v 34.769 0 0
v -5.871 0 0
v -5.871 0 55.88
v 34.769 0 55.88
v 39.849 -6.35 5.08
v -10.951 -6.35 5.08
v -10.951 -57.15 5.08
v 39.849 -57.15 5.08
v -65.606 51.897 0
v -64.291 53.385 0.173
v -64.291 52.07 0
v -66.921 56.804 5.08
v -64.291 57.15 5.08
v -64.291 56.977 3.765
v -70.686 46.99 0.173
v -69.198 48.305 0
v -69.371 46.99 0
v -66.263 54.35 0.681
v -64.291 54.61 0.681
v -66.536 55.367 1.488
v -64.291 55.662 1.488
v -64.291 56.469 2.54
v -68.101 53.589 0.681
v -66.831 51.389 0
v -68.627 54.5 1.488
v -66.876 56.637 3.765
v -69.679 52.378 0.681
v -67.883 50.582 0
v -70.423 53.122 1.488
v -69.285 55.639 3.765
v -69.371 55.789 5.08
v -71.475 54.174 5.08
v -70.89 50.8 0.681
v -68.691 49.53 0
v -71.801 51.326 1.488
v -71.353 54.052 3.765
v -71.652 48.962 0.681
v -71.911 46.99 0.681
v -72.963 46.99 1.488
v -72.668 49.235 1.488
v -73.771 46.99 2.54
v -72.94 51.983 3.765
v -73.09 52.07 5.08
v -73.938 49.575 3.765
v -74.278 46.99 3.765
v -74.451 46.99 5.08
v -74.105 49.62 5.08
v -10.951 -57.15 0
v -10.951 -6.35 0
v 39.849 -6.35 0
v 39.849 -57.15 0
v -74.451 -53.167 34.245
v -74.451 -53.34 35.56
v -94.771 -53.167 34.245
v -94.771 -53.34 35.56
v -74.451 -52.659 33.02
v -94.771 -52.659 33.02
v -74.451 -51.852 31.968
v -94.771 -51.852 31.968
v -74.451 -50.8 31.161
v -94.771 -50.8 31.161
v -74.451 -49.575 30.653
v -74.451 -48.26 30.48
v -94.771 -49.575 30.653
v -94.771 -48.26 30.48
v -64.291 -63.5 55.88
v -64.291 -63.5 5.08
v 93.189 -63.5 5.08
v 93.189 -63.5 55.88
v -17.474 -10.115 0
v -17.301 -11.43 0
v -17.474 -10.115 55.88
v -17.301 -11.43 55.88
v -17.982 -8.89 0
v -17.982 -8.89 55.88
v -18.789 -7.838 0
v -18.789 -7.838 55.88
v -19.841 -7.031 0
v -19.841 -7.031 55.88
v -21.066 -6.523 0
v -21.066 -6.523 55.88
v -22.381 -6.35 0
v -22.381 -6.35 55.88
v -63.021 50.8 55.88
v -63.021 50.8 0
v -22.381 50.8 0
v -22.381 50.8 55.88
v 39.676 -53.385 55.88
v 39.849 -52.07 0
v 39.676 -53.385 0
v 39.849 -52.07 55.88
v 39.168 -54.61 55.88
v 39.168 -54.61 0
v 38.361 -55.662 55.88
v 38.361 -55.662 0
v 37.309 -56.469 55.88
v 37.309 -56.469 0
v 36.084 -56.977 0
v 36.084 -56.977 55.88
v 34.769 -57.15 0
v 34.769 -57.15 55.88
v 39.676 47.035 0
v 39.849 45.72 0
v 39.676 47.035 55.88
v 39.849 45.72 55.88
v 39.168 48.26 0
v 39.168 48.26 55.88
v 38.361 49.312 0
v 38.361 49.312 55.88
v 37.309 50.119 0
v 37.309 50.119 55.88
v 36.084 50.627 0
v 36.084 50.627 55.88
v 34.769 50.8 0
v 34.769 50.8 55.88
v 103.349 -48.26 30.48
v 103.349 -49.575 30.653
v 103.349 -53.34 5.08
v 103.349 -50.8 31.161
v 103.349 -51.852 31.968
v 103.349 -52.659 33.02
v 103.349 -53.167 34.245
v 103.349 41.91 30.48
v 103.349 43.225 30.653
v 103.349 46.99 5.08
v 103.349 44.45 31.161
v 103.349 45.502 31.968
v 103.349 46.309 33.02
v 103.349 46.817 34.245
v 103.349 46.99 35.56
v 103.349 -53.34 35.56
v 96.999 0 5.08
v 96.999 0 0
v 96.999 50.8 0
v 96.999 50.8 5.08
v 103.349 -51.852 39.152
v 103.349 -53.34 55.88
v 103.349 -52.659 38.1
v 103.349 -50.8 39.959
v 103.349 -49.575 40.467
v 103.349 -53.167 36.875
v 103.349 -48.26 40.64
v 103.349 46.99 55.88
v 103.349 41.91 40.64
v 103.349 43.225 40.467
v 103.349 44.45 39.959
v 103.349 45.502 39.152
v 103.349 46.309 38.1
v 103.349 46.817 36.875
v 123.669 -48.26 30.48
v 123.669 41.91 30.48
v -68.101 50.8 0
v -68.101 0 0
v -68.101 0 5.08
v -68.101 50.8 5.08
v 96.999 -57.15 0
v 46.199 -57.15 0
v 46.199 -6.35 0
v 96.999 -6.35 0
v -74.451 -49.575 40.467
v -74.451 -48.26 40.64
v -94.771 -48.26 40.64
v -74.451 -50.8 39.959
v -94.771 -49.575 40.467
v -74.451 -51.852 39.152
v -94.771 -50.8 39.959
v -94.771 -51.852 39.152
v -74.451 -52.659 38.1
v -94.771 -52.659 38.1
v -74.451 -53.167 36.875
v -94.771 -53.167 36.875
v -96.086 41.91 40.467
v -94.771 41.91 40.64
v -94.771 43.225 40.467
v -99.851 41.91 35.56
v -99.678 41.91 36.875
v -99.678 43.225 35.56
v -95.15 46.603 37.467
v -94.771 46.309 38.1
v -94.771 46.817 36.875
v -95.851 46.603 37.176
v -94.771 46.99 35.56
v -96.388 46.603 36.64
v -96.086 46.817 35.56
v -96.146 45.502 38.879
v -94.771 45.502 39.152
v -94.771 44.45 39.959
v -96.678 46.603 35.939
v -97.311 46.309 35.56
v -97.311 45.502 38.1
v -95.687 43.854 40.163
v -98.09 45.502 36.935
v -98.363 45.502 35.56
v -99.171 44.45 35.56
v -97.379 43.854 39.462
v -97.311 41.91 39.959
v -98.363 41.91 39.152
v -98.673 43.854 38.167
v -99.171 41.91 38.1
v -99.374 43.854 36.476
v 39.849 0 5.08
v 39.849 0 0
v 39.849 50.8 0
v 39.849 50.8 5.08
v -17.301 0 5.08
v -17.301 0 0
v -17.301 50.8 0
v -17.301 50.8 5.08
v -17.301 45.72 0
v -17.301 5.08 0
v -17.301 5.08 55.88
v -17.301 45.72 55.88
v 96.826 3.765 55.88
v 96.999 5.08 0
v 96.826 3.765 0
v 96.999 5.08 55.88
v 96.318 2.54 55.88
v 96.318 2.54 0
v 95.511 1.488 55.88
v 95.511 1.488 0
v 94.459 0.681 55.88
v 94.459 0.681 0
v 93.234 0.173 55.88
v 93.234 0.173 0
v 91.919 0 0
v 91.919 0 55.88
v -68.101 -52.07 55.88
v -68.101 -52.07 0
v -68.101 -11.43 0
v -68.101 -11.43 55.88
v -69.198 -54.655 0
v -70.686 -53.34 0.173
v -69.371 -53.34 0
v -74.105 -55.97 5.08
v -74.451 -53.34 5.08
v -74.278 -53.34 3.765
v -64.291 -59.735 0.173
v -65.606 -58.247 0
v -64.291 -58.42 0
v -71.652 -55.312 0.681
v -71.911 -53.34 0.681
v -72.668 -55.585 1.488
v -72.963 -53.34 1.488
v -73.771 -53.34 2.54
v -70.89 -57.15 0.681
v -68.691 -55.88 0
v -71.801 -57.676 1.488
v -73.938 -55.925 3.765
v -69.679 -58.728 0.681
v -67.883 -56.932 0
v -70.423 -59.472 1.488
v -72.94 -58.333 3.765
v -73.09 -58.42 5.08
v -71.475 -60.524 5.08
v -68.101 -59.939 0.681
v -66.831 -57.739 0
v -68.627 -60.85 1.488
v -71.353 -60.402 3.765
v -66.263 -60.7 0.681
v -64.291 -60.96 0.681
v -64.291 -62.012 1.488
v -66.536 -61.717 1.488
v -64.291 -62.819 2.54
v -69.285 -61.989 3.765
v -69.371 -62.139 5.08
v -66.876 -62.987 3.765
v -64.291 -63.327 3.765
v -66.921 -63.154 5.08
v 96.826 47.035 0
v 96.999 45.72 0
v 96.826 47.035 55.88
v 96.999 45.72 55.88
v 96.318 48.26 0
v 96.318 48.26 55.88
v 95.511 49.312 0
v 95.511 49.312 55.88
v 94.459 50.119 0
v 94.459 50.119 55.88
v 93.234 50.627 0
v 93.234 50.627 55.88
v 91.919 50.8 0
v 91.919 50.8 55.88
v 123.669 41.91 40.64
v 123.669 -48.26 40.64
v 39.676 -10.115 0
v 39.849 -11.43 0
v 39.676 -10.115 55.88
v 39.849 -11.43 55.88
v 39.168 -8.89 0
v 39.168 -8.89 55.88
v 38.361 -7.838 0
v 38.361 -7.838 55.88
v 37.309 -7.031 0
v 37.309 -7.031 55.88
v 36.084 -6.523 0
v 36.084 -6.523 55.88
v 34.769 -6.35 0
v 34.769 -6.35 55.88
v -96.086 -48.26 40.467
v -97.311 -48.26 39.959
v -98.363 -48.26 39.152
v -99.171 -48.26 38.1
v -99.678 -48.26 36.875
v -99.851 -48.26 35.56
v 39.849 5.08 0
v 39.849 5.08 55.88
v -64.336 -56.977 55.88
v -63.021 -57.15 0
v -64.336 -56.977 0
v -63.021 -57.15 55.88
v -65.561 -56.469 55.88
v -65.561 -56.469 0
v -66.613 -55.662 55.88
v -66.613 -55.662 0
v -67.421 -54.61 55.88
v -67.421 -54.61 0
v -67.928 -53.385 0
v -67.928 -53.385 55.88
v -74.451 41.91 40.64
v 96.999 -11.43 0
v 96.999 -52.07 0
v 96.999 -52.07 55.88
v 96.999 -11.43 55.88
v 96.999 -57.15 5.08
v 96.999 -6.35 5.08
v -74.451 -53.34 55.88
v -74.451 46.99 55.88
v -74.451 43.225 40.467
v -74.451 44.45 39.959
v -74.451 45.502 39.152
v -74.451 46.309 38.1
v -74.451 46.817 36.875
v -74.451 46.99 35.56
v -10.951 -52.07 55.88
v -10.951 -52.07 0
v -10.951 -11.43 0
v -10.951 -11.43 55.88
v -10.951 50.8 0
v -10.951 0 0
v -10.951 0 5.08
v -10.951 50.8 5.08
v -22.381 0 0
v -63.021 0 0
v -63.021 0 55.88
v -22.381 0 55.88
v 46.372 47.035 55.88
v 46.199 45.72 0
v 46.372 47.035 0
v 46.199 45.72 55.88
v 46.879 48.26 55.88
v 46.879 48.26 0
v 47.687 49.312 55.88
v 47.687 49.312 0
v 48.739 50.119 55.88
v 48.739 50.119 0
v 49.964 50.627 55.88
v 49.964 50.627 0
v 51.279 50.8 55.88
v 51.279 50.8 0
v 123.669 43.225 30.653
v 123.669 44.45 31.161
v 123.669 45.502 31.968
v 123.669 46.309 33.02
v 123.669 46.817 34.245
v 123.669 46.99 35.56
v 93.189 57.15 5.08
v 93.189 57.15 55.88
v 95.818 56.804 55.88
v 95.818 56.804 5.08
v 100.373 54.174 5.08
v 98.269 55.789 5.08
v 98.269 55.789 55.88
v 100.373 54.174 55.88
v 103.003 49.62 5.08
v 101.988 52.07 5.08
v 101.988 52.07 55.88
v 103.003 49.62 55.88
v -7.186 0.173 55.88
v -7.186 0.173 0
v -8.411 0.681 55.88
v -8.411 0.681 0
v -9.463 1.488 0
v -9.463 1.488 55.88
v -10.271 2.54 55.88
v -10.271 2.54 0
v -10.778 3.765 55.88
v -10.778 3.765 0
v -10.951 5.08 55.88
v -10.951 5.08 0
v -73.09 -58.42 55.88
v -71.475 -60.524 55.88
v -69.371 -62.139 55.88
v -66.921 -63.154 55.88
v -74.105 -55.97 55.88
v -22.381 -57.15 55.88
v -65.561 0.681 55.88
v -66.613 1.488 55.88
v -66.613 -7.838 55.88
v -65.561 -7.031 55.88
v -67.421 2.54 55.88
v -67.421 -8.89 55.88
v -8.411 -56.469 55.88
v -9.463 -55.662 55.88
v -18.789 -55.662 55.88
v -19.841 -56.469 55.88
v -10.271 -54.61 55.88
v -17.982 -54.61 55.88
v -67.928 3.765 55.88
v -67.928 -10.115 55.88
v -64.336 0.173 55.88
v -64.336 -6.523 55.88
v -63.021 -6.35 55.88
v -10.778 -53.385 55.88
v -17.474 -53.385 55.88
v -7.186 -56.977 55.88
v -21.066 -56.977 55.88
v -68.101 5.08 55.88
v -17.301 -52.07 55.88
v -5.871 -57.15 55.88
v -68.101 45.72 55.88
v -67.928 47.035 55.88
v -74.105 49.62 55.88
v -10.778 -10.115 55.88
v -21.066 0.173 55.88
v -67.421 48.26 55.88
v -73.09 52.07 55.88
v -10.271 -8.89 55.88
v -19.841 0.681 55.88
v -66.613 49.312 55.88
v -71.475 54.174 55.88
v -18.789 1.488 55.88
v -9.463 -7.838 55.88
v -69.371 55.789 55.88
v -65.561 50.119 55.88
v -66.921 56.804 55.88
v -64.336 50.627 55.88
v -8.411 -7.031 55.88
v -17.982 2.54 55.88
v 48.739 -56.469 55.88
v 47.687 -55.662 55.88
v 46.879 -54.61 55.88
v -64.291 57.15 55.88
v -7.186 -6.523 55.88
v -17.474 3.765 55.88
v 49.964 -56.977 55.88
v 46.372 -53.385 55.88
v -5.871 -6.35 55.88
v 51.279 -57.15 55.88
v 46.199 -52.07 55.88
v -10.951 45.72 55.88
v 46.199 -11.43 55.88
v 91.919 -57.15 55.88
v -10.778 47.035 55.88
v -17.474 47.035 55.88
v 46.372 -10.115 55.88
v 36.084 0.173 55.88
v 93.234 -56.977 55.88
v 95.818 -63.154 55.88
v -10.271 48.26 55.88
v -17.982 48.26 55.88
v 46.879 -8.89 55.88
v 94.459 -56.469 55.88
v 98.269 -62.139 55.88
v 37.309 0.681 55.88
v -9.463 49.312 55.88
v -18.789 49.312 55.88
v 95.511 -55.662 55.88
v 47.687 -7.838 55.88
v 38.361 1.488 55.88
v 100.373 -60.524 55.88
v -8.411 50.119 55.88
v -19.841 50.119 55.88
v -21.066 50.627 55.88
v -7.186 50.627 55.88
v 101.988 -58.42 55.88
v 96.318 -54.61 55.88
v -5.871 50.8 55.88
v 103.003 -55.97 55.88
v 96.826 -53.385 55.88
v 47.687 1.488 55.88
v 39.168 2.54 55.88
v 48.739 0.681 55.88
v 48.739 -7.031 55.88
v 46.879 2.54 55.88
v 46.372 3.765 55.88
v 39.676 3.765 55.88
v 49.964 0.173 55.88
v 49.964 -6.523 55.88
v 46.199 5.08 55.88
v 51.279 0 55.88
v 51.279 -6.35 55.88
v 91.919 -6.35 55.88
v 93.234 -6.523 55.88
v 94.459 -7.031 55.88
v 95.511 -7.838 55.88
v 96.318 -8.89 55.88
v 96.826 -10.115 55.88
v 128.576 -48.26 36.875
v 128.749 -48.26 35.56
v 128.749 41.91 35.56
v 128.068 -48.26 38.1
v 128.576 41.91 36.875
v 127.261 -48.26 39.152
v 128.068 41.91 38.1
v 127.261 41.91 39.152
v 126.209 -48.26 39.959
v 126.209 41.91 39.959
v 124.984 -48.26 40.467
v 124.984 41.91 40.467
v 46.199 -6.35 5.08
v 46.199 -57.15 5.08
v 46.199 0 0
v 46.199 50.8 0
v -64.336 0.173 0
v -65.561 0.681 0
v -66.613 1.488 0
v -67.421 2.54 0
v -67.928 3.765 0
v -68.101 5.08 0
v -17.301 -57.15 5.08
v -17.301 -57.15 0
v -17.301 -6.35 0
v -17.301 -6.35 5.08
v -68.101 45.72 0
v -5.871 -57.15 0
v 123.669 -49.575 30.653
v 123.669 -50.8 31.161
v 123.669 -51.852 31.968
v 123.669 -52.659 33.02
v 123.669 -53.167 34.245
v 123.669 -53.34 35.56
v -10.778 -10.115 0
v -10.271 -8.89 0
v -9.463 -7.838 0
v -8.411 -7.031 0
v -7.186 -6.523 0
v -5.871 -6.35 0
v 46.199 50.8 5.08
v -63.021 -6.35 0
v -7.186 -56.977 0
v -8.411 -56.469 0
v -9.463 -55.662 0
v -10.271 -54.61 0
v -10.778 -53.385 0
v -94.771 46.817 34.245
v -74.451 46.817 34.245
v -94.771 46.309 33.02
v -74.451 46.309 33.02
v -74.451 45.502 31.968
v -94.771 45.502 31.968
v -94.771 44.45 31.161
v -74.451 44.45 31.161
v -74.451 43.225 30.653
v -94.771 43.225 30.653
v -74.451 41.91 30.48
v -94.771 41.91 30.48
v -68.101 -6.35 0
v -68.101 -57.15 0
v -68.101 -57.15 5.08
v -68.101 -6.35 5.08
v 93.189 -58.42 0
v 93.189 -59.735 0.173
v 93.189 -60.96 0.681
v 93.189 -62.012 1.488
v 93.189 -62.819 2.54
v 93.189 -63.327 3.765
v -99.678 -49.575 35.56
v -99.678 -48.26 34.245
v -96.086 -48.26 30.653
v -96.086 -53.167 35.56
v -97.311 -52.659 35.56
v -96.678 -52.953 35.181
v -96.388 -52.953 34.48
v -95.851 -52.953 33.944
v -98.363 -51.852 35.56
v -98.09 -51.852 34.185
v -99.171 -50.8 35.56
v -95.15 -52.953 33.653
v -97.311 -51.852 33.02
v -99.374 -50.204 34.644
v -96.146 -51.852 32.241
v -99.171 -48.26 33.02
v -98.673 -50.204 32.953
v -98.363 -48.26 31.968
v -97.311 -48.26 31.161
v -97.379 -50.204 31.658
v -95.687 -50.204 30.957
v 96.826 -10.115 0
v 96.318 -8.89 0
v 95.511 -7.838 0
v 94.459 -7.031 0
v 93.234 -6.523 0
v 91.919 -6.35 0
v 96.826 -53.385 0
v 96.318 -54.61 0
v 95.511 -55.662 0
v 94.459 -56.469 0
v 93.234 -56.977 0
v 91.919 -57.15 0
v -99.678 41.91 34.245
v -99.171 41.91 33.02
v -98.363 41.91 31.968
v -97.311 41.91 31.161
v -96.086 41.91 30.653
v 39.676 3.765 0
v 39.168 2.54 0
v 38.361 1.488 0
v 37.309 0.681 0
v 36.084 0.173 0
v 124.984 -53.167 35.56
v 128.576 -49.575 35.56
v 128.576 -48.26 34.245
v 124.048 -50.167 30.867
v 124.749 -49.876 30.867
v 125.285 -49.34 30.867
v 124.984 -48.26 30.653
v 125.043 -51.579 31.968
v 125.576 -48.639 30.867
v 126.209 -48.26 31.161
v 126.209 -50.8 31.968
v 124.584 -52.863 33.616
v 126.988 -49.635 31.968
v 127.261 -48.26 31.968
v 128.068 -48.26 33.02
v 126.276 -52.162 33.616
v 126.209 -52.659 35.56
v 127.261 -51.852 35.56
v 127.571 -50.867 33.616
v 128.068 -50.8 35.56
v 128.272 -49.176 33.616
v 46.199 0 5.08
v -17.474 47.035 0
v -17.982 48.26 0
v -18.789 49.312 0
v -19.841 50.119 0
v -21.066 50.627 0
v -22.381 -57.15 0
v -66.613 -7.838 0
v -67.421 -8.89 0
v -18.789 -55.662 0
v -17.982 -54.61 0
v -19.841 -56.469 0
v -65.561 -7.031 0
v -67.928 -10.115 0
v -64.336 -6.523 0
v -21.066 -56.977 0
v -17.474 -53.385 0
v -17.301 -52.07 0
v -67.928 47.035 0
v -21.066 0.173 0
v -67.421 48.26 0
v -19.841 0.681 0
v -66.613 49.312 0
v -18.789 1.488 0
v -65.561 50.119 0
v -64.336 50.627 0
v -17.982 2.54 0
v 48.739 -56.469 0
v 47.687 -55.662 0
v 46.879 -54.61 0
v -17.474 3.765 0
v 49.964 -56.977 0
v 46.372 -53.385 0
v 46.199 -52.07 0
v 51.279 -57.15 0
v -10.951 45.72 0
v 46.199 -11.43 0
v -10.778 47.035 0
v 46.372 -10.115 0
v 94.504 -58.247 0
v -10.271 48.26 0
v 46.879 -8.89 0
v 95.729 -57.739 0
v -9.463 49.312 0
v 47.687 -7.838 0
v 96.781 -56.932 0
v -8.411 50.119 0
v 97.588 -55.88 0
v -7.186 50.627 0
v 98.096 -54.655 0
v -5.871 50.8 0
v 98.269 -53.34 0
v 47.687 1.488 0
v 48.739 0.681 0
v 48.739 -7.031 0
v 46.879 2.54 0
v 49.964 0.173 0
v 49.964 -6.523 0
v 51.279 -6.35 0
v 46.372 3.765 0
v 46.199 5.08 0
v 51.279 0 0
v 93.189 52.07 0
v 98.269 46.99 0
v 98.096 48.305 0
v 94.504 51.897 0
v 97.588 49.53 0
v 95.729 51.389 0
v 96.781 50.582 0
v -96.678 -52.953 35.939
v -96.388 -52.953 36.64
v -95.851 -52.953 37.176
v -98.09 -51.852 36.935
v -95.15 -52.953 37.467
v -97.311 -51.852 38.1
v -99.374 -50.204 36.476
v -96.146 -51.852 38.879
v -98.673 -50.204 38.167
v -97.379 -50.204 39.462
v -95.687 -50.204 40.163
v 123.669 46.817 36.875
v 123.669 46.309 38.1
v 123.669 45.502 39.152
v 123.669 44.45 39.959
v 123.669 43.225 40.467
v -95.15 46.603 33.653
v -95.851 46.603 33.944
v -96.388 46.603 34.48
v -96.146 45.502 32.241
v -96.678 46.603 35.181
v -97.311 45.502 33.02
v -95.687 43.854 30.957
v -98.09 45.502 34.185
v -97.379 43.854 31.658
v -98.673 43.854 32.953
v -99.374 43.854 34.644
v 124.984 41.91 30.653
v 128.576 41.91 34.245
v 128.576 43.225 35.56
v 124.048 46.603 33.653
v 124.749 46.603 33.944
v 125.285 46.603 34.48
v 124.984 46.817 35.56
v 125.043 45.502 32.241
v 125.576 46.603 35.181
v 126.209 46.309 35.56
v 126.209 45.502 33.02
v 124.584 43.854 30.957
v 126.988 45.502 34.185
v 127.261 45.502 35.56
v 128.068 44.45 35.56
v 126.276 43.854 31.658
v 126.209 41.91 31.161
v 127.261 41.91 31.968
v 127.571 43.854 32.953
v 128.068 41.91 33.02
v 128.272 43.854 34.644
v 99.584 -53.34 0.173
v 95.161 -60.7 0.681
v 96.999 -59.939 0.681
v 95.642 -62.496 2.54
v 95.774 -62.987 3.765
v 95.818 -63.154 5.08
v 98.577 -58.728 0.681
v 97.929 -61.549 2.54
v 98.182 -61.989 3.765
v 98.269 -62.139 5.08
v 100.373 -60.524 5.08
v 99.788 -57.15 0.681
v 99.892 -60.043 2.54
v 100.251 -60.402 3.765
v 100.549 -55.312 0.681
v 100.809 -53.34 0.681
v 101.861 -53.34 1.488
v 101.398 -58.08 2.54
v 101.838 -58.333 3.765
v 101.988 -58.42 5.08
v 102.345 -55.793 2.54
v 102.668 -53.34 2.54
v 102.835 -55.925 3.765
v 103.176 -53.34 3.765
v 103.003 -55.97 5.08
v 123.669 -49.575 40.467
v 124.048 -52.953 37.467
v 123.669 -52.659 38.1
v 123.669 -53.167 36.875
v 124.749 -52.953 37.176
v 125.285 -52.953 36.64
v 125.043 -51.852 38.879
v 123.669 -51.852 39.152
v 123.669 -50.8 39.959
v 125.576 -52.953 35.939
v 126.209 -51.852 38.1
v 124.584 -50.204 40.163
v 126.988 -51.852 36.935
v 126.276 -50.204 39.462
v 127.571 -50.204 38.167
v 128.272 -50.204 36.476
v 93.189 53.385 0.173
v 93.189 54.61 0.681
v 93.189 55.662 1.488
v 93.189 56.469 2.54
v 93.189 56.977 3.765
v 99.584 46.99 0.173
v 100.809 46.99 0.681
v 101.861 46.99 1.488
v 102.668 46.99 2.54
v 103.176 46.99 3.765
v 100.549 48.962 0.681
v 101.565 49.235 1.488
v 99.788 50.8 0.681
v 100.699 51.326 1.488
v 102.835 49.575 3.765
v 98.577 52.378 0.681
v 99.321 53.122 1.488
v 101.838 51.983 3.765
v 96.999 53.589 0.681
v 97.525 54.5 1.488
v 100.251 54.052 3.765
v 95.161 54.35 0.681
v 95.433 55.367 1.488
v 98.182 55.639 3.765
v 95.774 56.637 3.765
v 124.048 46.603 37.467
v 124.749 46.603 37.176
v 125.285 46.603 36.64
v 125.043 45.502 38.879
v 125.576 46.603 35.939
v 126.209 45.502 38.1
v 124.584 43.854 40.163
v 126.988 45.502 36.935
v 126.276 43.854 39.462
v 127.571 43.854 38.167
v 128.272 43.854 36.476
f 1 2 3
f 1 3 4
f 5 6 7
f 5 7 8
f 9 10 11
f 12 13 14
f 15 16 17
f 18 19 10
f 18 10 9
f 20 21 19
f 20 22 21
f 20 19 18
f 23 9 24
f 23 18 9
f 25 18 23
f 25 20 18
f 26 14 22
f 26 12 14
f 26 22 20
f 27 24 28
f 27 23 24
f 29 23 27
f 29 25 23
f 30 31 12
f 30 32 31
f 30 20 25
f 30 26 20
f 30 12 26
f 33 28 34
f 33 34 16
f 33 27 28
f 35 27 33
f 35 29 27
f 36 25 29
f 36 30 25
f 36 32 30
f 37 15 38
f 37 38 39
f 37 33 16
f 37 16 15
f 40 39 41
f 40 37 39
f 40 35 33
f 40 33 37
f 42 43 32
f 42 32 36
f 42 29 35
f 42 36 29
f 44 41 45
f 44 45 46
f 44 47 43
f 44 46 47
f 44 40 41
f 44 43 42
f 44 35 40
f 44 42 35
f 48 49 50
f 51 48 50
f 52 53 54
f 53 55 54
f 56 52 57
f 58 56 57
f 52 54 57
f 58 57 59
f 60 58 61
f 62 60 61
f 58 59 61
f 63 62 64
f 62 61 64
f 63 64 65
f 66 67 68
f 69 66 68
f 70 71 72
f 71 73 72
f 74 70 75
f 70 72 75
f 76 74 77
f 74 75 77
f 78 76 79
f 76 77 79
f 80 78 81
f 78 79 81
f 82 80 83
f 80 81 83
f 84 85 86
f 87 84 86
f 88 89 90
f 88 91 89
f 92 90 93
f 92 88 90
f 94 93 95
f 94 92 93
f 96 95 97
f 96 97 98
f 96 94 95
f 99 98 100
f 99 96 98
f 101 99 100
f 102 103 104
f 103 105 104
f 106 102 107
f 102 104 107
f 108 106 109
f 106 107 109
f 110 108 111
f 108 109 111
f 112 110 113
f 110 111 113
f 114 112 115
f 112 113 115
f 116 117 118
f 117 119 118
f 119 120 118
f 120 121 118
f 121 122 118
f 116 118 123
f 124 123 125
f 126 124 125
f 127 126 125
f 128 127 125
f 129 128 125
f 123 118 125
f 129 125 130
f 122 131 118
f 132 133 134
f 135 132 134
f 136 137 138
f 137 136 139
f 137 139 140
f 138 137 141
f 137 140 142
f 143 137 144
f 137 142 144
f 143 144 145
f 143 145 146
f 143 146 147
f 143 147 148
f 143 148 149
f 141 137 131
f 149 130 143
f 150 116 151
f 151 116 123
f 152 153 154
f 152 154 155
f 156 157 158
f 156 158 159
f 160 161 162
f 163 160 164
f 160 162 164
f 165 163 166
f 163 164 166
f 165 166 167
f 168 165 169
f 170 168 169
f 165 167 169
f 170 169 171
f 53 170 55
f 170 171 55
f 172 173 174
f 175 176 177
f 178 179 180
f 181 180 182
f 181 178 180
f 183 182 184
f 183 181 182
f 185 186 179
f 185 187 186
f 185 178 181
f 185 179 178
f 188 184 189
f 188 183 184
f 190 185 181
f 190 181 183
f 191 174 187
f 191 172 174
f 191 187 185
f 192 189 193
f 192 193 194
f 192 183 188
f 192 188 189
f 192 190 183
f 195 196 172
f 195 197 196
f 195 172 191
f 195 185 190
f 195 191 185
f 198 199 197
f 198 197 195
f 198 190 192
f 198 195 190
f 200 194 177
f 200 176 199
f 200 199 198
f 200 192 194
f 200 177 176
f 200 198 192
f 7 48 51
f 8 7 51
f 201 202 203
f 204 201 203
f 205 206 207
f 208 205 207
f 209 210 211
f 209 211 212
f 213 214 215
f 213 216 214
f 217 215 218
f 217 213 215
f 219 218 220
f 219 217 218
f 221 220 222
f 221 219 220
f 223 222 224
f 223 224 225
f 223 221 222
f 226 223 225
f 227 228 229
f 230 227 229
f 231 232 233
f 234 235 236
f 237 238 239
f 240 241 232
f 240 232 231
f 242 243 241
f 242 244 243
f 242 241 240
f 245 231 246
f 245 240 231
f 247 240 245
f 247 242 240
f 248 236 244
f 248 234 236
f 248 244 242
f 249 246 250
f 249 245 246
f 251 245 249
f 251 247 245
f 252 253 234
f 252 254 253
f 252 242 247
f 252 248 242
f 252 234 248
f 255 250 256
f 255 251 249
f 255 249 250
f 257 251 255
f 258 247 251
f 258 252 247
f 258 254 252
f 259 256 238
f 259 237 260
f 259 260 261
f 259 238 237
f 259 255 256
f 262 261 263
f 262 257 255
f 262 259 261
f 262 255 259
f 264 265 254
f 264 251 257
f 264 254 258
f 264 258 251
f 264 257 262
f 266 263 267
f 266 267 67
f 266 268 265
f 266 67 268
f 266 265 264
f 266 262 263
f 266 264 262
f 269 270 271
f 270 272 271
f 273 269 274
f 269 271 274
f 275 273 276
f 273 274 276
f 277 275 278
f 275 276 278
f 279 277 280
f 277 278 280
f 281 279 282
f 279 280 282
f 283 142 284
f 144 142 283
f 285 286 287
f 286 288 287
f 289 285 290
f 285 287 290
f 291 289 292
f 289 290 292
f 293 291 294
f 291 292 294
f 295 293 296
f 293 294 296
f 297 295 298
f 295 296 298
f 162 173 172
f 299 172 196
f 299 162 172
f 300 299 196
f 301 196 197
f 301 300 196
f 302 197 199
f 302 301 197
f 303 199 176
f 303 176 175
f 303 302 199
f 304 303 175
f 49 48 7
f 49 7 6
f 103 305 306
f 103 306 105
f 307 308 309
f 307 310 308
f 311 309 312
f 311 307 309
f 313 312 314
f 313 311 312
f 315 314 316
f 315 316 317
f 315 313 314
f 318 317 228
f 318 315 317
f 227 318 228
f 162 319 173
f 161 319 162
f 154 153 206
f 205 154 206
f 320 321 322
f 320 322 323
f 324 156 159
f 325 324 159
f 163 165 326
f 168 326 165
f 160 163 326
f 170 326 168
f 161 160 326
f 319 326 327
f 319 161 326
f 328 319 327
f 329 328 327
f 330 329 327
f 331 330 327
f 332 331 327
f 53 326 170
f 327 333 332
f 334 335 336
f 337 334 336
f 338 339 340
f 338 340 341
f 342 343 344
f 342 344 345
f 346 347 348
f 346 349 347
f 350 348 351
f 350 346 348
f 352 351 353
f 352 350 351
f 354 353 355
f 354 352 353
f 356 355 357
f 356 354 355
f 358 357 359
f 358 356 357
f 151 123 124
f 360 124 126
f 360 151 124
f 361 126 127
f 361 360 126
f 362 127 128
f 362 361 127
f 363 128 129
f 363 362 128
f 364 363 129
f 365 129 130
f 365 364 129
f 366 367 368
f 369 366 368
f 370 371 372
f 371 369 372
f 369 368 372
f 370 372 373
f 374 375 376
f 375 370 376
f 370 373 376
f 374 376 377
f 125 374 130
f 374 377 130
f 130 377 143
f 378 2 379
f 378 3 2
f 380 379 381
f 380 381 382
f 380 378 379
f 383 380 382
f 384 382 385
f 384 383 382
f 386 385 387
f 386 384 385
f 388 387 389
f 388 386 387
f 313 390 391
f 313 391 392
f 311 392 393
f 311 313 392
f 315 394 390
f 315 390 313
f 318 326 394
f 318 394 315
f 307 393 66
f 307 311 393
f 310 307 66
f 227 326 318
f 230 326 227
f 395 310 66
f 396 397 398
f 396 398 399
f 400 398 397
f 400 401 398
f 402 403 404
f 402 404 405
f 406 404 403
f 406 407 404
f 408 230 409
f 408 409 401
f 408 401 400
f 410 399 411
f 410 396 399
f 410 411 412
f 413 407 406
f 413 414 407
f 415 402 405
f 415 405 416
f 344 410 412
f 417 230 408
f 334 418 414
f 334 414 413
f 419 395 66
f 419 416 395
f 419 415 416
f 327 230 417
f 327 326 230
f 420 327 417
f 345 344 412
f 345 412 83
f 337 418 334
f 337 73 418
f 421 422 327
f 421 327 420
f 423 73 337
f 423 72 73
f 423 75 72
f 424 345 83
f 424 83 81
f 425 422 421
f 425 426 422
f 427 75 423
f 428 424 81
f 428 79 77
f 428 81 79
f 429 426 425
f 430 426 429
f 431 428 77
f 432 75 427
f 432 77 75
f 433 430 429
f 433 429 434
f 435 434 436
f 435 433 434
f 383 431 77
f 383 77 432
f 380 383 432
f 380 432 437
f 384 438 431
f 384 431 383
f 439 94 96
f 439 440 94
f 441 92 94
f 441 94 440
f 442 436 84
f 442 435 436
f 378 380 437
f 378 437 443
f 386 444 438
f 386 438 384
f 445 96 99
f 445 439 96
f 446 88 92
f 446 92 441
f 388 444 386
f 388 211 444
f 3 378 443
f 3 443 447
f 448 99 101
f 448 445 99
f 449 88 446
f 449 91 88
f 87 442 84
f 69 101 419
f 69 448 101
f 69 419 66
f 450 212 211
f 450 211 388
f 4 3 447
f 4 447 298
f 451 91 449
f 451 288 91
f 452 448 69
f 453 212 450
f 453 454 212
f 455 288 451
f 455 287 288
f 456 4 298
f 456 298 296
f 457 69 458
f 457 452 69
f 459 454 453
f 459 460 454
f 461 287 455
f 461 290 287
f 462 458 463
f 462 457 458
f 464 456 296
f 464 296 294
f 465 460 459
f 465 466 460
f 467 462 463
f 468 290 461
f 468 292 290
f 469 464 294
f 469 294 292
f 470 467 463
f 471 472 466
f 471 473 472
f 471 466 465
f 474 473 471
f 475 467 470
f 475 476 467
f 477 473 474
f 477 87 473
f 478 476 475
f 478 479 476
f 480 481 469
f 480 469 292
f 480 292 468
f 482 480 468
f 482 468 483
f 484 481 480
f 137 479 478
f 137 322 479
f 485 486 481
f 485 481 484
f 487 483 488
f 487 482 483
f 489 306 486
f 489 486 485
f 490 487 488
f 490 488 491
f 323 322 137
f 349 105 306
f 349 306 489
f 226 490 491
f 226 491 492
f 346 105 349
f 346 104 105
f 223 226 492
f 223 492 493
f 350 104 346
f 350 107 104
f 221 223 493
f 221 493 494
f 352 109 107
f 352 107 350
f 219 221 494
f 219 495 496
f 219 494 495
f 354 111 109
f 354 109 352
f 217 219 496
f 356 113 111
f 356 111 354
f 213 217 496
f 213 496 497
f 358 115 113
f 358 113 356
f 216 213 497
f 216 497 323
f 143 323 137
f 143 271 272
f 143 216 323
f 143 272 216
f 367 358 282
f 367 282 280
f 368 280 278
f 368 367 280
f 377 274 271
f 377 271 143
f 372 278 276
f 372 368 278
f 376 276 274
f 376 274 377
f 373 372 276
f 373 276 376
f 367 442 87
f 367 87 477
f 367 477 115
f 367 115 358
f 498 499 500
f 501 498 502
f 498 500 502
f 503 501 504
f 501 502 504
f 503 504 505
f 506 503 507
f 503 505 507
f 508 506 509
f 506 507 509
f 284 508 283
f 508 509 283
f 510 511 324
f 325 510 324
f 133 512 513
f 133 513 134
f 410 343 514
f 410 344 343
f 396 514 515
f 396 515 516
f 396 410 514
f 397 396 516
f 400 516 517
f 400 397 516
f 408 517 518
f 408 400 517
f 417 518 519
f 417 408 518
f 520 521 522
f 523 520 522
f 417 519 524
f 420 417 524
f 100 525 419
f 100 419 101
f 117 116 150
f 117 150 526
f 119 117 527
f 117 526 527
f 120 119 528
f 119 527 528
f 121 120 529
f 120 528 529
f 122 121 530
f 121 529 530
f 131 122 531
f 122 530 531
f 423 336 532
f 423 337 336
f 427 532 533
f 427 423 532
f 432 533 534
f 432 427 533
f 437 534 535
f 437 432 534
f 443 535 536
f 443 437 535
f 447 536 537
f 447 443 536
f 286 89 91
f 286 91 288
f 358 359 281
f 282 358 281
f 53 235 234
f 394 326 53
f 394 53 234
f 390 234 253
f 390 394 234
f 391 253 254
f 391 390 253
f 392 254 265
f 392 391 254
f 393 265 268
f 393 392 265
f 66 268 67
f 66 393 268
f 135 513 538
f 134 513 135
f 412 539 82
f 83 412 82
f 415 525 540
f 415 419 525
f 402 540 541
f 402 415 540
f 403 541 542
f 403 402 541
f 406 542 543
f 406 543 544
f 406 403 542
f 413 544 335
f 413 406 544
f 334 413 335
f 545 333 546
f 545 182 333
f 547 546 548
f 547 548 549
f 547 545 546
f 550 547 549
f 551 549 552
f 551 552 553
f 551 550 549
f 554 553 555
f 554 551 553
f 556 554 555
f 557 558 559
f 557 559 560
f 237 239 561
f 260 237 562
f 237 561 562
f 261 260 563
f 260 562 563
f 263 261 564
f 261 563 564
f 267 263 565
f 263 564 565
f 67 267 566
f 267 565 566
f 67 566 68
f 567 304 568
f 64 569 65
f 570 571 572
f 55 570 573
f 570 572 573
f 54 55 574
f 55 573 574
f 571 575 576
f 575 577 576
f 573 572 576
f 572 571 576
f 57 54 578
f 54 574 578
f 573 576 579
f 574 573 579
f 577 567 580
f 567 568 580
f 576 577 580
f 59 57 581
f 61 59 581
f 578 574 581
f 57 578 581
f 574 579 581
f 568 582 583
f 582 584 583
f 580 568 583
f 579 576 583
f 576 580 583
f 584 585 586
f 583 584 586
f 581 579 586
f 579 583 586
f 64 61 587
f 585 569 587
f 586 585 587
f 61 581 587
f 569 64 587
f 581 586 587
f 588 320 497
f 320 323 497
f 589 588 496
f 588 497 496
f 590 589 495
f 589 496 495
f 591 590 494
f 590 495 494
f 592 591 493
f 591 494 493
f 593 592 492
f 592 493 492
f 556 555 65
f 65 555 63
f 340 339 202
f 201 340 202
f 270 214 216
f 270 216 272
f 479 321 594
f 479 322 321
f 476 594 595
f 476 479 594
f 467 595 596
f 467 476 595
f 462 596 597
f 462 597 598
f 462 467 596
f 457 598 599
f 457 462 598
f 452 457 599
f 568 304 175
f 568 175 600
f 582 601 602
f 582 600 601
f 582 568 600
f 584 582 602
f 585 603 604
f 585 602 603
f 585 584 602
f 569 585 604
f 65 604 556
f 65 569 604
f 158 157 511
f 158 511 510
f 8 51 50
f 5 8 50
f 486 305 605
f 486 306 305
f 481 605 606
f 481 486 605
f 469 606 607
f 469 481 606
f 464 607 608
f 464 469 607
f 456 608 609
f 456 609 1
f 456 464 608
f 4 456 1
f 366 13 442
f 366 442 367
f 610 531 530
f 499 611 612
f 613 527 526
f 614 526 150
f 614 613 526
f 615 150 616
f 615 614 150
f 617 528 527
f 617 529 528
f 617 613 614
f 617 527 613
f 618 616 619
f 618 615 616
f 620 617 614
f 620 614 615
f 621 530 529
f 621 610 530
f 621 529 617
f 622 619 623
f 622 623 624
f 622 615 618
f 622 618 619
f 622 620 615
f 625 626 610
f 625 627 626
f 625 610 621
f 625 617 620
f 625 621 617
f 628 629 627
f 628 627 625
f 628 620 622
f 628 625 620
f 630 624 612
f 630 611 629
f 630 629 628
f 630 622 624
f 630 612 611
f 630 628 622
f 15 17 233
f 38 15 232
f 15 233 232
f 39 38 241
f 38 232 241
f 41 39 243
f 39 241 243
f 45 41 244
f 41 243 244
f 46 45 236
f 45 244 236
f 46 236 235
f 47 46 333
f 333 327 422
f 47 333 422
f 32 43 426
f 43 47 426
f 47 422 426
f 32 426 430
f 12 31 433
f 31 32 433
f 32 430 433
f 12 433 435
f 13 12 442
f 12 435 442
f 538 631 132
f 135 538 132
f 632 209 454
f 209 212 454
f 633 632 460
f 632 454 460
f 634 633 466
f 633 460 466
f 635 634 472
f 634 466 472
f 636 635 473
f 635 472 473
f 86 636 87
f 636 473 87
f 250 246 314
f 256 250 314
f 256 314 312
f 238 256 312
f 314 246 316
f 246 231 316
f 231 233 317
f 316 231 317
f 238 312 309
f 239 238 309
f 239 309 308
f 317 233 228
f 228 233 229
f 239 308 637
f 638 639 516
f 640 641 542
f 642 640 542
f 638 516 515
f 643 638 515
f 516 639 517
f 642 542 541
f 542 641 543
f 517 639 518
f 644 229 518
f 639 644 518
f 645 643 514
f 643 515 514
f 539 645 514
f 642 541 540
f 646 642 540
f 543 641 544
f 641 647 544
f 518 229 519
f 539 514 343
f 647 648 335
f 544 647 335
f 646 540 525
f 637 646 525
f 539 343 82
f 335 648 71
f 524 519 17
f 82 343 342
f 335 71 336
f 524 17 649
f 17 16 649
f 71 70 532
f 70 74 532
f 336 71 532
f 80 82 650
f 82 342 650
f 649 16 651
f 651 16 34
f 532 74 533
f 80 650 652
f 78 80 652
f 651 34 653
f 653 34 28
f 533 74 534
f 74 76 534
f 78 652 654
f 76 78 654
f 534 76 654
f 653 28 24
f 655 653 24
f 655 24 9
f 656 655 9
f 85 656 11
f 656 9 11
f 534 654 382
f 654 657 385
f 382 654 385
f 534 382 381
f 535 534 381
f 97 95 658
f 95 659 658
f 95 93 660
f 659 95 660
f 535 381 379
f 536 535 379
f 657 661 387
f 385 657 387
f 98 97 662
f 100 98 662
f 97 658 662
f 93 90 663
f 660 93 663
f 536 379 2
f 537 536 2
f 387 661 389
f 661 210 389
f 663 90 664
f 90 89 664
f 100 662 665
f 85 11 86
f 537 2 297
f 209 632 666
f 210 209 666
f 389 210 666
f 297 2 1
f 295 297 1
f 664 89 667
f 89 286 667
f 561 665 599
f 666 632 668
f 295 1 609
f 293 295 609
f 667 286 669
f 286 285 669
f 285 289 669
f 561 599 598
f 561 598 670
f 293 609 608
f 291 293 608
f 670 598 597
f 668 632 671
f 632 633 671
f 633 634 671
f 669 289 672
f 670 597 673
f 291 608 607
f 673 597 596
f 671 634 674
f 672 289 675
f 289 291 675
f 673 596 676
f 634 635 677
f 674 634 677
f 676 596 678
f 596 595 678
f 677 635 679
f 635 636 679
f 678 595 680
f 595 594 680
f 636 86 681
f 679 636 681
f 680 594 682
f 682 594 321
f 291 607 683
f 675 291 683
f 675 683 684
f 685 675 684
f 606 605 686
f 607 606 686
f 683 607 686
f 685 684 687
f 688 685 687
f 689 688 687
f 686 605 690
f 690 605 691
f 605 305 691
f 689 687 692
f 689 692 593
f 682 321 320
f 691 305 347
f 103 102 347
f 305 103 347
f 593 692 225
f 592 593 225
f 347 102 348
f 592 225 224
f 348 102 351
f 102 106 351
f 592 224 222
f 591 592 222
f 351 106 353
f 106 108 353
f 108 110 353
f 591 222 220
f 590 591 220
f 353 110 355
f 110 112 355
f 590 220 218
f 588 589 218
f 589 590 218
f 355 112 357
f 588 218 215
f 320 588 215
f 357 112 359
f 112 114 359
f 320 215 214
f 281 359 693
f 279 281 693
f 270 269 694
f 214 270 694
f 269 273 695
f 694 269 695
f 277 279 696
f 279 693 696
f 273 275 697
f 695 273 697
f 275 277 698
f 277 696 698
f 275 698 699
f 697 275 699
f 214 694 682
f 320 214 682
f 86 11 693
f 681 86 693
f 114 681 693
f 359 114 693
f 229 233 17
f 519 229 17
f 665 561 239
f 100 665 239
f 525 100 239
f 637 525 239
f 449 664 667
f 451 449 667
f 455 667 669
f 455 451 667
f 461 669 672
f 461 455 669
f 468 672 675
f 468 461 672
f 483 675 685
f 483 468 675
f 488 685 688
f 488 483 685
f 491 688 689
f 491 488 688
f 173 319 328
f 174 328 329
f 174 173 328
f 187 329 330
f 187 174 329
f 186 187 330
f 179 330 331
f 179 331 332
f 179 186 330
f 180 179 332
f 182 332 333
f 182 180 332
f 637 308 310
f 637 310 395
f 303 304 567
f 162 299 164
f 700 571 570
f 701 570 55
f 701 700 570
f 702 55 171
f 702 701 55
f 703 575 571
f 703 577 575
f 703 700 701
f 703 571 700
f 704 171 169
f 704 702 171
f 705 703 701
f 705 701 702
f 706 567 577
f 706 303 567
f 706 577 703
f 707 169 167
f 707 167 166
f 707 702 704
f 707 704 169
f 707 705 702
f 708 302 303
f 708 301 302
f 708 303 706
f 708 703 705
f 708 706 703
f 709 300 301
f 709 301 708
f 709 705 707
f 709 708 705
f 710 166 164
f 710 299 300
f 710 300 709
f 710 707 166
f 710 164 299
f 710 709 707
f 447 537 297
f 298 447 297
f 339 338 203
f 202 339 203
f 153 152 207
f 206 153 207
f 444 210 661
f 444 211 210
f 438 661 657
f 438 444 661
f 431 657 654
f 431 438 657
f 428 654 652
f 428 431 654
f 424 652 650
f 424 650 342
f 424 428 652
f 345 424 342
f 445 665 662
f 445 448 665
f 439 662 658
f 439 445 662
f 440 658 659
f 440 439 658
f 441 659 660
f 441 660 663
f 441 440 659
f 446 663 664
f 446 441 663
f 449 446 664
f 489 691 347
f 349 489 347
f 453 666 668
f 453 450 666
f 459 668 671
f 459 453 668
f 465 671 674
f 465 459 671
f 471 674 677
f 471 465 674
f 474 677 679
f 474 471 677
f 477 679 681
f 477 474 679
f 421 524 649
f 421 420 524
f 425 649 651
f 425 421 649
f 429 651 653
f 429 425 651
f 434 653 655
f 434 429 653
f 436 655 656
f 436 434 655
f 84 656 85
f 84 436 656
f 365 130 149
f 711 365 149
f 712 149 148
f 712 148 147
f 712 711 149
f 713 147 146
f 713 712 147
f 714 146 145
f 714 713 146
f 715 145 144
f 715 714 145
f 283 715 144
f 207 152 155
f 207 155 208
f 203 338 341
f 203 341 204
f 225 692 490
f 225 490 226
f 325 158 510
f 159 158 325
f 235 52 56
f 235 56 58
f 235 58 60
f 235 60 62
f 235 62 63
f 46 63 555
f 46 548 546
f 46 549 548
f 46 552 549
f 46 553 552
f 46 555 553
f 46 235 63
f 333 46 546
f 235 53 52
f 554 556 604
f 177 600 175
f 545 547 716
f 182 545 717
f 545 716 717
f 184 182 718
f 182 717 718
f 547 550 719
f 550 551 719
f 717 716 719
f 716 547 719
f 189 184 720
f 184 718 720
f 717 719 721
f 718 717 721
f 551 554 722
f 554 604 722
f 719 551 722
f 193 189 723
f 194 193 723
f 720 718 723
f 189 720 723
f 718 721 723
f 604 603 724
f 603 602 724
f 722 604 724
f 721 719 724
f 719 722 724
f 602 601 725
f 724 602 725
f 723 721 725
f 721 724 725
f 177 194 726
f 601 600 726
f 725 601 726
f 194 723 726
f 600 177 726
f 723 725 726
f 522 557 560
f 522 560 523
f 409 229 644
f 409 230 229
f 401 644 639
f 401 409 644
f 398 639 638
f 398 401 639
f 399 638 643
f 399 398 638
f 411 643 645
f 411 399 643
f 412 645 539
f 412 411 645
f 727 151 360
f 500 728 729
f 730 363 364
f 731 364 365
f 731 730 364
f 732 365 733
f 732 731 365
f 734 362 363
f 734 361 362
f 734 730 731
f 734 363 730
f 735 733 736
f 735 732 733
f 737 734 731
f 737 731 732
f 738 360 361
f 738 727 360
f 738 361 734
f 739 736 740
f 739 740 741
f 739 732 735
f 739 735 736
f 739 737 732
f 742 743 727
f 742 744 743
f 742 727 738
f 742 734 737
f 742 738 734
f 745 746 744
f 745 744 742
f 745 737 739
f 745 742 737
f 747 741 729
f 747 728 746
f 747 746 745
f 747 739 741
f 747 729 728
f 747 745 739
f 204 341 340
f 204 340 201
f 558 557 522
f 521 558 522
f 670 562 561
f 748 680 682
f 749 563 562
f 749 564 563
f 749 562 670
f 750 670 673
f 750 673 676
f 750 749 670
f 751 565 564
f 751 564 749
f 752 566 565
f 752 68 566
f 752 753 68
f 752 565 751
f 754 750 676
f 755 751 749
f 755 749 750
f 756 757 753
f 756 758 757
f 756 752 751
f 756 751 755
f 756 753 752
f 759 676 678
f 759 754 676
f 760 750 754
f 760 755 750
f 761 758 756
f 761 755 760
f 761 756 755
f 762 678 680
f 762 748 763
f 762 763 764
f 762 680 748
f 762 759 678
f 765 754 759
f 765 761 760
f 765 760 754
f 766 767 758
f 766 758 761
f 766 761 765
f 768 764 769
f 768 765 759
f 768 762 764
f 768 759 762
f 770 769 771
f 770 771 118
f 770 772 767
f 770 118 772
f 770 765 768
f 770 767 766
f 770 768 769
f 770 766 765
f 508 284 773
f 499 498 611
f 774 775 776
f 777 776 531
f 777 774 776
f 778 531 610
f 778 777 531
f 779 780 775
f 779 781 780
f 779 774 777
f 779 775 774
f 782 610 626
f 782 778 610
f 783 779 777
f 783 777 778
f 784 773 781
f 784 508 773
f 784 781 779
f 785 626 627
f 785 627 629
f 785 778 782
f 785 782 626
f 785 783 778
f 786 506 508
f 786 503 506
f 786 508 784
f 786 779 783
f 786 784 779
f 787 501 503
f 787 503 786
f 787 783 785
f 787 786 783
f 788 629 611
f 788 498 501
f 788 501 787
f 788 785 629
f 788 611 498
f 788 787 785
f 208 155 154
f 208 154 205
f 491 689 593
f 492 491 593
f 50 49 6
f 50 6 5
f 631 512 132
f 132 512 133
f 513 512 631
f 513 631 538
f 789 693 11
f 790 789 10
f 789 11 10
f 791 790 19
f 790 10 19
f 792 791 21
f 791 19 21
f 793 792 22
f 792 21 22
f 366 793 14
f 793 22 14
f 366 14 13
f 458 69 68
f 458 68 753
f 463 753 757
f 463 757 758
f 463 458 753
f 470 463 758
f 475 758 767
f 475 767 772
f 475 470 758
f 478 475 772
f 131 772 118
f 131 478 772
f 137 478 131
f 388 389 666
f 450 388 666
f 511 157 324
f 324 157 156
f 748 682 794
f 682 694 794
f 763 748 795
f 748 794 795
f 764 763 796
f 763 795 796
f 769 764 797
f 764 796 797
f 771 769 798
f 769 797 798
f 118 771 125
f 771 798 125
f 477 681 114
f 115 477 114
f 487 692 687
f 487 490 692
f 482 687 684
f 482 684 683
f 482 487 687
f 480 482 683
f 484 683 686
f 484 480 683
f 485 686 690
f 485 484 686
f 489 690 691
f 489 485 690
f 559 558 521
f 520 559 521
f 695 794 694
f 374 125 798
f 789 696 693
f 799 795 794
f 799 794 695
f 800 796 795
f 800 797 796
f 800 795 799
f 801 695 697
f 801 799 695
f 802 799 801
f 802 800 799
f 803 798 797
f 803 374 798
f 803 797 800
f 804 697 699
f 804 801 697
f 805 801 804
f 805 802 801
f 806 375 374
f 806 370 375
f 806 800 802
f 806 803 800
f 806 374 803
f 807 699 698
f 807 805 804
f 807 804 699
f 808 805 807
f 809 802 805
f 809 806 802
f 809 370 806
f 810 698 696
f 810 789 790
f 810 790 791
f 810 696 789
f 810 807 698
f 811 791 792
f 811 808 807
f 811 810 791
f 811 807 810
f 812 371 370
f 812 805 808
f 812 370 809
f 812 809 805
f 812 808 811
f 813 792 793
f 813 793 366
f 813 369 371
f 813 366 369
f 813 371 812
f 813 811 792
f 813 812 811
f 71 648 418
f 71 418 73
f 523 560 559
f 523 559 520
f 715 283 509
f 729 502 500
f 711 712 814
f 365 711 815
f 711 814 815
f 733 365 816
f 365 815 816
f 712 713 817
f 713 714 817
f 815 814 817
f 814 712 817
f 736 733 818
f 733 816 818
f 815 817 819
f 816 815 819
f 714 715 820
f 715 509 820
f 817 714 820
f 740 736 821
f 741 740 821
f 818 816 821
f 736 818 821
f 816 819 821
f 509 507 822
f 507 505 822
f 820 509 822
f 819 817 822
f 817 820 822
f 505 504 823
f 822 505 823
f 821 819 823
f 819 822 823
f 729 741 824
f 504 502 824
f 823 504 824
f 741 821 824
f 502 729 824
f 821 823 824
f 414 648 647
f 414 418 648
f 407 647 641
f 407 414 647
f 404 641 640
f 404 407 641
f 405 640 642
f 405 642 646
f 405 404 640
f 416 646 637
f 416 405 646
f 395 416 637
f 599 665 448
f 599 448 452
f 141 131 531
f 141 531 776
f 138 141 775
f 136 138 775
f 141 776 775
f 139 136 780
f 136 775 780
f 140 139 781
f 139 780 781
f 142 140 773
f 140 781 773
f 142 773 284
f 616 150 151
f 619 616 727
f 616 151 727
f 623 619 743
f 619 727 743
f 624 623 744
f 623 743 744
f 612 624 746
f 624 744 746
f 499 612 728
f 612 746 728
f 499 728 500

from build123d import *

# Parameters (mm, degrees)
F0_W     = 50.8
F0_H     = 50.8
F1_DEPTH = 5.08
F0_W_2   = 177.8
F0_H_2   = 120.65
F2_DEPTH = 55.88
F3_R     = 10.16
F4_R     = 5.08
F5_W     = 100.33
F5_H     = 10.16
F6_DEPTH = 25.4
F7_R     = 5.07999
F8_W     = 100.33
F8_H     = 10.16
F9_DEPTH = 25.4
F10_R    = 5.07999


# Not quite as in the source:
# - a fillet or chamfer is up to 0.001 mm smaller than in the source, because OpenCascade refuses the exact size


with BuildPart() as f1:
    # F0 (on Top) → F1 (new body)
    with BuildSketch(Plane.XY):
        with Locations((71.5988487065, -31.75)):
            Rectangle(F0_W, F0_H)
    extrude(amount=F1_DEPTH)


with BuildPart() as f1b:
    # F0 (on Top) → F1, piece 2 (new body)
    with BuildSketch(Plane.XY):
        with Locations((14.4488487065, -31.75)):
            Rectangle(F0_W, F0_H)
    extrude(amount=F1_DEPTH)


with BuildPart() as f1c:
    # F0 (on Top) → F1, piece 3 (new body)
    with BuildSketch(Plane.XY):
        with Locations((-42.7011512935, -31.75)):
            Rectangle(F0_W, F0_H)
    extrude(amount=F1_DEPTH)


with BuildPart() as f1d:
    # F0 (on Top) → F1, piece 4 (new body)
    with BuildSketch(Plane.XY):
        with Locations((-42.7011512935, 25.4)):
            Rectangle(F0_W, F0_H)
    extrude(amount=F1_DEPTH)


with BuildPart() as f1e:
    # F0 (on Top) → F1, piece 5 (new body)
    with BuildSketch(Plane.XY):
        with Locations((14.4488487065, 25.4)):
            Rectangle(F0_W, F0_H)
    extrude(amount=F1_DEPTH)


with BuildPart() as f1f:
    # F0 (on Top) → F1, piece 6 (new body)
    with BuildSketch(Plane.XY):
        with Locations((71.5988487065, 25.4)):
            Rectangle(F0_W, F0_H)
    extrude(amount=F1_DEPTH)


with BuildPart() as f2:
    # F0 (on Top) → F2 (new body)
    with BuildSketch(Plane.XY):
        with Locations((14.4488487065, -3.175)):
            Rectangle(F0_W_2, F0_H_2)
        with Locations((-42.7011512935, -31.75)):
            Rectangle(F0_W, F0_H, mode=Mode.SUBTRACT)
        with Locations((14.4488487065, -31.75)):
            Rectangle(F0_W, F0_H, mode=Mode.SUBTRACT)
        with Locations((71.5988487065, -31.75)):
            Rectangle(F0_W, F0_H, mode=Mode.SUBTRACT)
        with Locations((-42.7011512935, 25.4)):
            Rectangle(F0_W, F0_H, mode=Mode.SUBTRACT)
        with Locations((14.4488487065, 25.4)):
            Rectangle(F0_W, F0_H, mode=Mode.SUBTRACT)
        with Locations((71.5988487065, 25.4)):
            Rectangle(F0_W, F0_H, mode=Mode.SUBTRACT)
    extrude(amount=F2_DEPTH)

    # F3
    f3_edges = [f2.edges().sort_by_distance(p)[0] for p in [
        (103.348849, -63.5, 27.94),
        (103.348849, 57.15, 27.94),
        (-74.451151, 57.15, 27.94),
        (-74.451151, -63.5, 27.94),
    ]]
    fillet(f3_edges, radius=F3_R)

    # F4 (call 1 of 25: OpenCascade refuses the feature's edges together)
    f4_edges = [f2.edges().sort_by_distance(p)[0] for p in [
        (-17.301151, -6.35, 27.94),
    ]]
    fillet(f4_edges, radius=F4_R)

    # F4#2 (call 2 of 25)
    f4_2_edges = [f2.edges().sort_by_distance(p)[0] for p in [
        (-17.301151, 50.8, 27.94),
    ]]
    fillet(f4_2_edges, radius=F4_R)

    # F4#3 (call 3 of 25)
    f4_3_edges = [f2.edges().sort_by_distance(p)[0] for p in [
        (39.848849, 50.8, 27.94),
    ]]
    fillet(f4_3_edges, radius=F4_R)

    # F4#4 (call 4 of 25)
    f4_4_edges = [f2.edges().sort_by_distance(p)[0] for p in [
        (96.998849, 50.8, 27.94),
    ]]
    fillet(f4_4_edges, radius=F4_R)

    # F4#5 (call 5 of 25)
    f4_5_edges = [f2.edges().sort_by_distance(p)[0] for p in [
        (96.998849, -6.35, 27.94),
    ]]
    fillet(f4_5_edges, radius=F4_R)

    # F4#6 (call 6 of 25)
    f4_6_edges = [f2.edges().sort_by_distance(p)[0] for p in [
        (39.848849, -6.35, 27.94),
    ]]
    fillet(f4_6_edges, radius=F4_R)

    # F4#7 (call 7 of 25)
    f4_7_edges = [f2.edges().sort_by_distance(p)[0] for p in [
        (96.998849, 0, 27.94),
    ]]
    fillet(f4_7_edges, radius=F4_R)

    # F4#8 (call 8 of 25)
    f4_8_edges = [f2.edges().sort_by_distance(p)[0] for p in [
        (39.848849, 0, 27.94),
    ]]
    fillet(f4_8_edges, radius=F4_R)

    # F4#9 (call 9 of 25)
    f4_9_edges = [f2.edges().sort_by_distance(p)[0] for p in [
        (-17.301151, 0, 27.94),
    ]]
    fillet(f4_9_edges, radius=F4_R)

    # F4#10 (call 10 of 25)
    f4_10_edges = [f2.edges().sort_by_distance(p)[0] for p in [
        (-17.301151, -57.15, 27.94),
    ]]
    fillet(f4_10_edges, radius=F4_R)

    # F4#11 (call 11 of 25)
    f4_11_edges = [f2.edges().sort_by_distance(p)[0] for p in [
        (39.848849, -57.15, 27.94),
    ]]
    fillet(f4_11_edges, radius=F4_R)

    # F4#12 (call 12 of 25)
    f4_12_edges = [f2.edges().sort_by_distance(p)[0] for p in [
        (96.998849, -57.15, 27.94),
    ]]
    fillet(f4_12_edges, radius=F4_R)

    # F4#13 (call 13 of 25)
    f4_13_edges = [f2.edges().sort_by_distance(p)[0] for p in [
        (46.198849, -57.15, 27.94),
    ]]
    fillet(f4_13_edges, radius=F4_R)

    # F4#14 (call 14 of 25)
    f4_14_edges = [f2.edges().sort_by_distance(p)[0] for p in [
        (46.198849, 0, 27.94),
    ]]
    fillet(f4_14_edges, radius=F4_R)

    # F4#15 (call 15 of 25)
    f4_15_edges = [f2.edges().sort_by_distance(p)[0] for p in [
        (-10.951151, -57.15, 27.94),
    ]]
    fillet(f4_15_edges, radius=F4_R)

    # F4#16 (call 16 of 25)
    f4_16_edges = [f2.edges().sort_by_distance(p)[0] for p in [
        (-10.951151, 0, 27.94),
    ]]
    fillet(f4_16_edges, radius=F4_R)

    # F4#17 (call 17 of 25)
    f4_17_edges = [f2.edges().sort_by_distance(p)[0] for p in [
        (-68.101151, 0, 27.94),
    ]]
    fillet(f4_17_edges, radius=F4_R)

    # F4#18 (call 18 of 25)
    f4_18_edges = [f2.edges().sort_by_distance(p)[0] for p in [
        (-68.101151, -57.15, 27.94),
    ]]
    fillet(f4_18_edges, radius=F4_R)

    # F4#19 (call 19 of 25)
    f4_19_edges = [f2.edges().sort_by_distance(p)[0] for p in [
        (46.198849, -6.35, 27.94),
    ]]
    fillet(f4_19_edges, radius=F4_R)

    # F4#20 (call 20 of 25)
    f4_20_edges = [f2.edges().sort_by_distance(p)[0] for p in [
        (46.198849, 50.8, 27.94),
    ]]
    fillet(f4_20_edges, radius=F4_R)

    # F4#21 (call 21 of 25)
    f4_21_edges = [f2.edges().sort_by_distance(p)[0] for p in [
        (-10.951151, 50.8, 27.94),
    ]]
    fillet(f4_21_edges, radius=F4_R)

    # F4#22 (call 22 of 25)
    f4_22_edges = [f2.edges().sort_by_distance(p)[0] for p in [
        (-10.951151, -6.35, 27.94),
    ]]
    fillet(f4_22_edges, radius=F4_R)

    # F4#23 (call 23 of 25)
    f4_23_edges = [f2.edges().sort_by_distance(p)[0] for p in [
        (-68.101151, -6.35, 27.94),
    ]]
    fillet(f4_23_edges, radius=F4_R)

    # F4#24 (call 24 of 25)
    f4_24_edges = [f2.edges().sort_by_distance(p)[0] for p in [
        (-68.101151, 50.8, 27.94),
    ]]
    fillet(f4_24_edges, radius=F4_R)

    # F4#25 (call 25 of 25)
    f4_25_edges = [f2.edges().sort_by_distance(p)[0] for p in [
        (103.348849, -3.175, 0),
        (14.448849, -63.5, 0),
    ]]
    fillet(f4_25_edges, radius=F4_R)

    # F5 (on face) → F6 (join)
    with BuildSketch(Plane.YZ.offset(103.3488487065)):
        with Locations((-3.175, 35.56)):
            Rectangle(F5_W, F5_H)
    extrude(amount=F6_DEPTH)

    # F7 (radius 5.08 in the source; OpenCascade refuses exactly that, so slightly less here)
    f7_edges = [f2.edges().sort_by_distance(p)[0] for p in [
        (128.748849, -3.175, 40.64),
        (116.048849, -53.34, 40.64),
        (128.748849, -53.34, 35.56),
        (116.048849, -53.34, 30.48),
        (128.748849, -3.175, 30.48),
        (116.048849, 46.99, 40.64),
        (116.048849, 46.99, 30.48),
        (128.748849, 46.99, 35.56),
    ]]
    fillet(f7_edges, radius=F7_R)

    # F8 (on face) → F9 (join)
    with BuildSketch(Plane(origin=(-74.4511512935, 0, 0), x_dir=(0, -1, 0), z_dir=(-1, 0, 0))):
        with Locations((3.175, 35.56)):
            Rectangle(F8_W, F8_H)
    extrude(amount=F9_DEPTH)

    # F10 (radius 5.08 in the source; OpenCascade refuses exactly that, so slightly less here)
    f10_edges = [f2.edges().sort_by_distance(p)[0] for p in [
        (-99.851151, -3.175, 40.64),
        (-99.851151, -3.175, 30.48),
        (-99.851151, -53.34, 35.56),
        (-87.151151, -53.34, 40.64),
        (-87.151151, -53.34, 30.48),
        (-87.151151, 46.99, 30.48),
        (-87.151151, 46.99, 40.64),
        (-99.851151, 46.99, 35.56),
    ]]
    fillet(f10_edges, radius=F10_R)


solid = Compound([f1.part, f1b.part, f1c.part, f1d.part, f1e.part, f1f.part, f2.part])
